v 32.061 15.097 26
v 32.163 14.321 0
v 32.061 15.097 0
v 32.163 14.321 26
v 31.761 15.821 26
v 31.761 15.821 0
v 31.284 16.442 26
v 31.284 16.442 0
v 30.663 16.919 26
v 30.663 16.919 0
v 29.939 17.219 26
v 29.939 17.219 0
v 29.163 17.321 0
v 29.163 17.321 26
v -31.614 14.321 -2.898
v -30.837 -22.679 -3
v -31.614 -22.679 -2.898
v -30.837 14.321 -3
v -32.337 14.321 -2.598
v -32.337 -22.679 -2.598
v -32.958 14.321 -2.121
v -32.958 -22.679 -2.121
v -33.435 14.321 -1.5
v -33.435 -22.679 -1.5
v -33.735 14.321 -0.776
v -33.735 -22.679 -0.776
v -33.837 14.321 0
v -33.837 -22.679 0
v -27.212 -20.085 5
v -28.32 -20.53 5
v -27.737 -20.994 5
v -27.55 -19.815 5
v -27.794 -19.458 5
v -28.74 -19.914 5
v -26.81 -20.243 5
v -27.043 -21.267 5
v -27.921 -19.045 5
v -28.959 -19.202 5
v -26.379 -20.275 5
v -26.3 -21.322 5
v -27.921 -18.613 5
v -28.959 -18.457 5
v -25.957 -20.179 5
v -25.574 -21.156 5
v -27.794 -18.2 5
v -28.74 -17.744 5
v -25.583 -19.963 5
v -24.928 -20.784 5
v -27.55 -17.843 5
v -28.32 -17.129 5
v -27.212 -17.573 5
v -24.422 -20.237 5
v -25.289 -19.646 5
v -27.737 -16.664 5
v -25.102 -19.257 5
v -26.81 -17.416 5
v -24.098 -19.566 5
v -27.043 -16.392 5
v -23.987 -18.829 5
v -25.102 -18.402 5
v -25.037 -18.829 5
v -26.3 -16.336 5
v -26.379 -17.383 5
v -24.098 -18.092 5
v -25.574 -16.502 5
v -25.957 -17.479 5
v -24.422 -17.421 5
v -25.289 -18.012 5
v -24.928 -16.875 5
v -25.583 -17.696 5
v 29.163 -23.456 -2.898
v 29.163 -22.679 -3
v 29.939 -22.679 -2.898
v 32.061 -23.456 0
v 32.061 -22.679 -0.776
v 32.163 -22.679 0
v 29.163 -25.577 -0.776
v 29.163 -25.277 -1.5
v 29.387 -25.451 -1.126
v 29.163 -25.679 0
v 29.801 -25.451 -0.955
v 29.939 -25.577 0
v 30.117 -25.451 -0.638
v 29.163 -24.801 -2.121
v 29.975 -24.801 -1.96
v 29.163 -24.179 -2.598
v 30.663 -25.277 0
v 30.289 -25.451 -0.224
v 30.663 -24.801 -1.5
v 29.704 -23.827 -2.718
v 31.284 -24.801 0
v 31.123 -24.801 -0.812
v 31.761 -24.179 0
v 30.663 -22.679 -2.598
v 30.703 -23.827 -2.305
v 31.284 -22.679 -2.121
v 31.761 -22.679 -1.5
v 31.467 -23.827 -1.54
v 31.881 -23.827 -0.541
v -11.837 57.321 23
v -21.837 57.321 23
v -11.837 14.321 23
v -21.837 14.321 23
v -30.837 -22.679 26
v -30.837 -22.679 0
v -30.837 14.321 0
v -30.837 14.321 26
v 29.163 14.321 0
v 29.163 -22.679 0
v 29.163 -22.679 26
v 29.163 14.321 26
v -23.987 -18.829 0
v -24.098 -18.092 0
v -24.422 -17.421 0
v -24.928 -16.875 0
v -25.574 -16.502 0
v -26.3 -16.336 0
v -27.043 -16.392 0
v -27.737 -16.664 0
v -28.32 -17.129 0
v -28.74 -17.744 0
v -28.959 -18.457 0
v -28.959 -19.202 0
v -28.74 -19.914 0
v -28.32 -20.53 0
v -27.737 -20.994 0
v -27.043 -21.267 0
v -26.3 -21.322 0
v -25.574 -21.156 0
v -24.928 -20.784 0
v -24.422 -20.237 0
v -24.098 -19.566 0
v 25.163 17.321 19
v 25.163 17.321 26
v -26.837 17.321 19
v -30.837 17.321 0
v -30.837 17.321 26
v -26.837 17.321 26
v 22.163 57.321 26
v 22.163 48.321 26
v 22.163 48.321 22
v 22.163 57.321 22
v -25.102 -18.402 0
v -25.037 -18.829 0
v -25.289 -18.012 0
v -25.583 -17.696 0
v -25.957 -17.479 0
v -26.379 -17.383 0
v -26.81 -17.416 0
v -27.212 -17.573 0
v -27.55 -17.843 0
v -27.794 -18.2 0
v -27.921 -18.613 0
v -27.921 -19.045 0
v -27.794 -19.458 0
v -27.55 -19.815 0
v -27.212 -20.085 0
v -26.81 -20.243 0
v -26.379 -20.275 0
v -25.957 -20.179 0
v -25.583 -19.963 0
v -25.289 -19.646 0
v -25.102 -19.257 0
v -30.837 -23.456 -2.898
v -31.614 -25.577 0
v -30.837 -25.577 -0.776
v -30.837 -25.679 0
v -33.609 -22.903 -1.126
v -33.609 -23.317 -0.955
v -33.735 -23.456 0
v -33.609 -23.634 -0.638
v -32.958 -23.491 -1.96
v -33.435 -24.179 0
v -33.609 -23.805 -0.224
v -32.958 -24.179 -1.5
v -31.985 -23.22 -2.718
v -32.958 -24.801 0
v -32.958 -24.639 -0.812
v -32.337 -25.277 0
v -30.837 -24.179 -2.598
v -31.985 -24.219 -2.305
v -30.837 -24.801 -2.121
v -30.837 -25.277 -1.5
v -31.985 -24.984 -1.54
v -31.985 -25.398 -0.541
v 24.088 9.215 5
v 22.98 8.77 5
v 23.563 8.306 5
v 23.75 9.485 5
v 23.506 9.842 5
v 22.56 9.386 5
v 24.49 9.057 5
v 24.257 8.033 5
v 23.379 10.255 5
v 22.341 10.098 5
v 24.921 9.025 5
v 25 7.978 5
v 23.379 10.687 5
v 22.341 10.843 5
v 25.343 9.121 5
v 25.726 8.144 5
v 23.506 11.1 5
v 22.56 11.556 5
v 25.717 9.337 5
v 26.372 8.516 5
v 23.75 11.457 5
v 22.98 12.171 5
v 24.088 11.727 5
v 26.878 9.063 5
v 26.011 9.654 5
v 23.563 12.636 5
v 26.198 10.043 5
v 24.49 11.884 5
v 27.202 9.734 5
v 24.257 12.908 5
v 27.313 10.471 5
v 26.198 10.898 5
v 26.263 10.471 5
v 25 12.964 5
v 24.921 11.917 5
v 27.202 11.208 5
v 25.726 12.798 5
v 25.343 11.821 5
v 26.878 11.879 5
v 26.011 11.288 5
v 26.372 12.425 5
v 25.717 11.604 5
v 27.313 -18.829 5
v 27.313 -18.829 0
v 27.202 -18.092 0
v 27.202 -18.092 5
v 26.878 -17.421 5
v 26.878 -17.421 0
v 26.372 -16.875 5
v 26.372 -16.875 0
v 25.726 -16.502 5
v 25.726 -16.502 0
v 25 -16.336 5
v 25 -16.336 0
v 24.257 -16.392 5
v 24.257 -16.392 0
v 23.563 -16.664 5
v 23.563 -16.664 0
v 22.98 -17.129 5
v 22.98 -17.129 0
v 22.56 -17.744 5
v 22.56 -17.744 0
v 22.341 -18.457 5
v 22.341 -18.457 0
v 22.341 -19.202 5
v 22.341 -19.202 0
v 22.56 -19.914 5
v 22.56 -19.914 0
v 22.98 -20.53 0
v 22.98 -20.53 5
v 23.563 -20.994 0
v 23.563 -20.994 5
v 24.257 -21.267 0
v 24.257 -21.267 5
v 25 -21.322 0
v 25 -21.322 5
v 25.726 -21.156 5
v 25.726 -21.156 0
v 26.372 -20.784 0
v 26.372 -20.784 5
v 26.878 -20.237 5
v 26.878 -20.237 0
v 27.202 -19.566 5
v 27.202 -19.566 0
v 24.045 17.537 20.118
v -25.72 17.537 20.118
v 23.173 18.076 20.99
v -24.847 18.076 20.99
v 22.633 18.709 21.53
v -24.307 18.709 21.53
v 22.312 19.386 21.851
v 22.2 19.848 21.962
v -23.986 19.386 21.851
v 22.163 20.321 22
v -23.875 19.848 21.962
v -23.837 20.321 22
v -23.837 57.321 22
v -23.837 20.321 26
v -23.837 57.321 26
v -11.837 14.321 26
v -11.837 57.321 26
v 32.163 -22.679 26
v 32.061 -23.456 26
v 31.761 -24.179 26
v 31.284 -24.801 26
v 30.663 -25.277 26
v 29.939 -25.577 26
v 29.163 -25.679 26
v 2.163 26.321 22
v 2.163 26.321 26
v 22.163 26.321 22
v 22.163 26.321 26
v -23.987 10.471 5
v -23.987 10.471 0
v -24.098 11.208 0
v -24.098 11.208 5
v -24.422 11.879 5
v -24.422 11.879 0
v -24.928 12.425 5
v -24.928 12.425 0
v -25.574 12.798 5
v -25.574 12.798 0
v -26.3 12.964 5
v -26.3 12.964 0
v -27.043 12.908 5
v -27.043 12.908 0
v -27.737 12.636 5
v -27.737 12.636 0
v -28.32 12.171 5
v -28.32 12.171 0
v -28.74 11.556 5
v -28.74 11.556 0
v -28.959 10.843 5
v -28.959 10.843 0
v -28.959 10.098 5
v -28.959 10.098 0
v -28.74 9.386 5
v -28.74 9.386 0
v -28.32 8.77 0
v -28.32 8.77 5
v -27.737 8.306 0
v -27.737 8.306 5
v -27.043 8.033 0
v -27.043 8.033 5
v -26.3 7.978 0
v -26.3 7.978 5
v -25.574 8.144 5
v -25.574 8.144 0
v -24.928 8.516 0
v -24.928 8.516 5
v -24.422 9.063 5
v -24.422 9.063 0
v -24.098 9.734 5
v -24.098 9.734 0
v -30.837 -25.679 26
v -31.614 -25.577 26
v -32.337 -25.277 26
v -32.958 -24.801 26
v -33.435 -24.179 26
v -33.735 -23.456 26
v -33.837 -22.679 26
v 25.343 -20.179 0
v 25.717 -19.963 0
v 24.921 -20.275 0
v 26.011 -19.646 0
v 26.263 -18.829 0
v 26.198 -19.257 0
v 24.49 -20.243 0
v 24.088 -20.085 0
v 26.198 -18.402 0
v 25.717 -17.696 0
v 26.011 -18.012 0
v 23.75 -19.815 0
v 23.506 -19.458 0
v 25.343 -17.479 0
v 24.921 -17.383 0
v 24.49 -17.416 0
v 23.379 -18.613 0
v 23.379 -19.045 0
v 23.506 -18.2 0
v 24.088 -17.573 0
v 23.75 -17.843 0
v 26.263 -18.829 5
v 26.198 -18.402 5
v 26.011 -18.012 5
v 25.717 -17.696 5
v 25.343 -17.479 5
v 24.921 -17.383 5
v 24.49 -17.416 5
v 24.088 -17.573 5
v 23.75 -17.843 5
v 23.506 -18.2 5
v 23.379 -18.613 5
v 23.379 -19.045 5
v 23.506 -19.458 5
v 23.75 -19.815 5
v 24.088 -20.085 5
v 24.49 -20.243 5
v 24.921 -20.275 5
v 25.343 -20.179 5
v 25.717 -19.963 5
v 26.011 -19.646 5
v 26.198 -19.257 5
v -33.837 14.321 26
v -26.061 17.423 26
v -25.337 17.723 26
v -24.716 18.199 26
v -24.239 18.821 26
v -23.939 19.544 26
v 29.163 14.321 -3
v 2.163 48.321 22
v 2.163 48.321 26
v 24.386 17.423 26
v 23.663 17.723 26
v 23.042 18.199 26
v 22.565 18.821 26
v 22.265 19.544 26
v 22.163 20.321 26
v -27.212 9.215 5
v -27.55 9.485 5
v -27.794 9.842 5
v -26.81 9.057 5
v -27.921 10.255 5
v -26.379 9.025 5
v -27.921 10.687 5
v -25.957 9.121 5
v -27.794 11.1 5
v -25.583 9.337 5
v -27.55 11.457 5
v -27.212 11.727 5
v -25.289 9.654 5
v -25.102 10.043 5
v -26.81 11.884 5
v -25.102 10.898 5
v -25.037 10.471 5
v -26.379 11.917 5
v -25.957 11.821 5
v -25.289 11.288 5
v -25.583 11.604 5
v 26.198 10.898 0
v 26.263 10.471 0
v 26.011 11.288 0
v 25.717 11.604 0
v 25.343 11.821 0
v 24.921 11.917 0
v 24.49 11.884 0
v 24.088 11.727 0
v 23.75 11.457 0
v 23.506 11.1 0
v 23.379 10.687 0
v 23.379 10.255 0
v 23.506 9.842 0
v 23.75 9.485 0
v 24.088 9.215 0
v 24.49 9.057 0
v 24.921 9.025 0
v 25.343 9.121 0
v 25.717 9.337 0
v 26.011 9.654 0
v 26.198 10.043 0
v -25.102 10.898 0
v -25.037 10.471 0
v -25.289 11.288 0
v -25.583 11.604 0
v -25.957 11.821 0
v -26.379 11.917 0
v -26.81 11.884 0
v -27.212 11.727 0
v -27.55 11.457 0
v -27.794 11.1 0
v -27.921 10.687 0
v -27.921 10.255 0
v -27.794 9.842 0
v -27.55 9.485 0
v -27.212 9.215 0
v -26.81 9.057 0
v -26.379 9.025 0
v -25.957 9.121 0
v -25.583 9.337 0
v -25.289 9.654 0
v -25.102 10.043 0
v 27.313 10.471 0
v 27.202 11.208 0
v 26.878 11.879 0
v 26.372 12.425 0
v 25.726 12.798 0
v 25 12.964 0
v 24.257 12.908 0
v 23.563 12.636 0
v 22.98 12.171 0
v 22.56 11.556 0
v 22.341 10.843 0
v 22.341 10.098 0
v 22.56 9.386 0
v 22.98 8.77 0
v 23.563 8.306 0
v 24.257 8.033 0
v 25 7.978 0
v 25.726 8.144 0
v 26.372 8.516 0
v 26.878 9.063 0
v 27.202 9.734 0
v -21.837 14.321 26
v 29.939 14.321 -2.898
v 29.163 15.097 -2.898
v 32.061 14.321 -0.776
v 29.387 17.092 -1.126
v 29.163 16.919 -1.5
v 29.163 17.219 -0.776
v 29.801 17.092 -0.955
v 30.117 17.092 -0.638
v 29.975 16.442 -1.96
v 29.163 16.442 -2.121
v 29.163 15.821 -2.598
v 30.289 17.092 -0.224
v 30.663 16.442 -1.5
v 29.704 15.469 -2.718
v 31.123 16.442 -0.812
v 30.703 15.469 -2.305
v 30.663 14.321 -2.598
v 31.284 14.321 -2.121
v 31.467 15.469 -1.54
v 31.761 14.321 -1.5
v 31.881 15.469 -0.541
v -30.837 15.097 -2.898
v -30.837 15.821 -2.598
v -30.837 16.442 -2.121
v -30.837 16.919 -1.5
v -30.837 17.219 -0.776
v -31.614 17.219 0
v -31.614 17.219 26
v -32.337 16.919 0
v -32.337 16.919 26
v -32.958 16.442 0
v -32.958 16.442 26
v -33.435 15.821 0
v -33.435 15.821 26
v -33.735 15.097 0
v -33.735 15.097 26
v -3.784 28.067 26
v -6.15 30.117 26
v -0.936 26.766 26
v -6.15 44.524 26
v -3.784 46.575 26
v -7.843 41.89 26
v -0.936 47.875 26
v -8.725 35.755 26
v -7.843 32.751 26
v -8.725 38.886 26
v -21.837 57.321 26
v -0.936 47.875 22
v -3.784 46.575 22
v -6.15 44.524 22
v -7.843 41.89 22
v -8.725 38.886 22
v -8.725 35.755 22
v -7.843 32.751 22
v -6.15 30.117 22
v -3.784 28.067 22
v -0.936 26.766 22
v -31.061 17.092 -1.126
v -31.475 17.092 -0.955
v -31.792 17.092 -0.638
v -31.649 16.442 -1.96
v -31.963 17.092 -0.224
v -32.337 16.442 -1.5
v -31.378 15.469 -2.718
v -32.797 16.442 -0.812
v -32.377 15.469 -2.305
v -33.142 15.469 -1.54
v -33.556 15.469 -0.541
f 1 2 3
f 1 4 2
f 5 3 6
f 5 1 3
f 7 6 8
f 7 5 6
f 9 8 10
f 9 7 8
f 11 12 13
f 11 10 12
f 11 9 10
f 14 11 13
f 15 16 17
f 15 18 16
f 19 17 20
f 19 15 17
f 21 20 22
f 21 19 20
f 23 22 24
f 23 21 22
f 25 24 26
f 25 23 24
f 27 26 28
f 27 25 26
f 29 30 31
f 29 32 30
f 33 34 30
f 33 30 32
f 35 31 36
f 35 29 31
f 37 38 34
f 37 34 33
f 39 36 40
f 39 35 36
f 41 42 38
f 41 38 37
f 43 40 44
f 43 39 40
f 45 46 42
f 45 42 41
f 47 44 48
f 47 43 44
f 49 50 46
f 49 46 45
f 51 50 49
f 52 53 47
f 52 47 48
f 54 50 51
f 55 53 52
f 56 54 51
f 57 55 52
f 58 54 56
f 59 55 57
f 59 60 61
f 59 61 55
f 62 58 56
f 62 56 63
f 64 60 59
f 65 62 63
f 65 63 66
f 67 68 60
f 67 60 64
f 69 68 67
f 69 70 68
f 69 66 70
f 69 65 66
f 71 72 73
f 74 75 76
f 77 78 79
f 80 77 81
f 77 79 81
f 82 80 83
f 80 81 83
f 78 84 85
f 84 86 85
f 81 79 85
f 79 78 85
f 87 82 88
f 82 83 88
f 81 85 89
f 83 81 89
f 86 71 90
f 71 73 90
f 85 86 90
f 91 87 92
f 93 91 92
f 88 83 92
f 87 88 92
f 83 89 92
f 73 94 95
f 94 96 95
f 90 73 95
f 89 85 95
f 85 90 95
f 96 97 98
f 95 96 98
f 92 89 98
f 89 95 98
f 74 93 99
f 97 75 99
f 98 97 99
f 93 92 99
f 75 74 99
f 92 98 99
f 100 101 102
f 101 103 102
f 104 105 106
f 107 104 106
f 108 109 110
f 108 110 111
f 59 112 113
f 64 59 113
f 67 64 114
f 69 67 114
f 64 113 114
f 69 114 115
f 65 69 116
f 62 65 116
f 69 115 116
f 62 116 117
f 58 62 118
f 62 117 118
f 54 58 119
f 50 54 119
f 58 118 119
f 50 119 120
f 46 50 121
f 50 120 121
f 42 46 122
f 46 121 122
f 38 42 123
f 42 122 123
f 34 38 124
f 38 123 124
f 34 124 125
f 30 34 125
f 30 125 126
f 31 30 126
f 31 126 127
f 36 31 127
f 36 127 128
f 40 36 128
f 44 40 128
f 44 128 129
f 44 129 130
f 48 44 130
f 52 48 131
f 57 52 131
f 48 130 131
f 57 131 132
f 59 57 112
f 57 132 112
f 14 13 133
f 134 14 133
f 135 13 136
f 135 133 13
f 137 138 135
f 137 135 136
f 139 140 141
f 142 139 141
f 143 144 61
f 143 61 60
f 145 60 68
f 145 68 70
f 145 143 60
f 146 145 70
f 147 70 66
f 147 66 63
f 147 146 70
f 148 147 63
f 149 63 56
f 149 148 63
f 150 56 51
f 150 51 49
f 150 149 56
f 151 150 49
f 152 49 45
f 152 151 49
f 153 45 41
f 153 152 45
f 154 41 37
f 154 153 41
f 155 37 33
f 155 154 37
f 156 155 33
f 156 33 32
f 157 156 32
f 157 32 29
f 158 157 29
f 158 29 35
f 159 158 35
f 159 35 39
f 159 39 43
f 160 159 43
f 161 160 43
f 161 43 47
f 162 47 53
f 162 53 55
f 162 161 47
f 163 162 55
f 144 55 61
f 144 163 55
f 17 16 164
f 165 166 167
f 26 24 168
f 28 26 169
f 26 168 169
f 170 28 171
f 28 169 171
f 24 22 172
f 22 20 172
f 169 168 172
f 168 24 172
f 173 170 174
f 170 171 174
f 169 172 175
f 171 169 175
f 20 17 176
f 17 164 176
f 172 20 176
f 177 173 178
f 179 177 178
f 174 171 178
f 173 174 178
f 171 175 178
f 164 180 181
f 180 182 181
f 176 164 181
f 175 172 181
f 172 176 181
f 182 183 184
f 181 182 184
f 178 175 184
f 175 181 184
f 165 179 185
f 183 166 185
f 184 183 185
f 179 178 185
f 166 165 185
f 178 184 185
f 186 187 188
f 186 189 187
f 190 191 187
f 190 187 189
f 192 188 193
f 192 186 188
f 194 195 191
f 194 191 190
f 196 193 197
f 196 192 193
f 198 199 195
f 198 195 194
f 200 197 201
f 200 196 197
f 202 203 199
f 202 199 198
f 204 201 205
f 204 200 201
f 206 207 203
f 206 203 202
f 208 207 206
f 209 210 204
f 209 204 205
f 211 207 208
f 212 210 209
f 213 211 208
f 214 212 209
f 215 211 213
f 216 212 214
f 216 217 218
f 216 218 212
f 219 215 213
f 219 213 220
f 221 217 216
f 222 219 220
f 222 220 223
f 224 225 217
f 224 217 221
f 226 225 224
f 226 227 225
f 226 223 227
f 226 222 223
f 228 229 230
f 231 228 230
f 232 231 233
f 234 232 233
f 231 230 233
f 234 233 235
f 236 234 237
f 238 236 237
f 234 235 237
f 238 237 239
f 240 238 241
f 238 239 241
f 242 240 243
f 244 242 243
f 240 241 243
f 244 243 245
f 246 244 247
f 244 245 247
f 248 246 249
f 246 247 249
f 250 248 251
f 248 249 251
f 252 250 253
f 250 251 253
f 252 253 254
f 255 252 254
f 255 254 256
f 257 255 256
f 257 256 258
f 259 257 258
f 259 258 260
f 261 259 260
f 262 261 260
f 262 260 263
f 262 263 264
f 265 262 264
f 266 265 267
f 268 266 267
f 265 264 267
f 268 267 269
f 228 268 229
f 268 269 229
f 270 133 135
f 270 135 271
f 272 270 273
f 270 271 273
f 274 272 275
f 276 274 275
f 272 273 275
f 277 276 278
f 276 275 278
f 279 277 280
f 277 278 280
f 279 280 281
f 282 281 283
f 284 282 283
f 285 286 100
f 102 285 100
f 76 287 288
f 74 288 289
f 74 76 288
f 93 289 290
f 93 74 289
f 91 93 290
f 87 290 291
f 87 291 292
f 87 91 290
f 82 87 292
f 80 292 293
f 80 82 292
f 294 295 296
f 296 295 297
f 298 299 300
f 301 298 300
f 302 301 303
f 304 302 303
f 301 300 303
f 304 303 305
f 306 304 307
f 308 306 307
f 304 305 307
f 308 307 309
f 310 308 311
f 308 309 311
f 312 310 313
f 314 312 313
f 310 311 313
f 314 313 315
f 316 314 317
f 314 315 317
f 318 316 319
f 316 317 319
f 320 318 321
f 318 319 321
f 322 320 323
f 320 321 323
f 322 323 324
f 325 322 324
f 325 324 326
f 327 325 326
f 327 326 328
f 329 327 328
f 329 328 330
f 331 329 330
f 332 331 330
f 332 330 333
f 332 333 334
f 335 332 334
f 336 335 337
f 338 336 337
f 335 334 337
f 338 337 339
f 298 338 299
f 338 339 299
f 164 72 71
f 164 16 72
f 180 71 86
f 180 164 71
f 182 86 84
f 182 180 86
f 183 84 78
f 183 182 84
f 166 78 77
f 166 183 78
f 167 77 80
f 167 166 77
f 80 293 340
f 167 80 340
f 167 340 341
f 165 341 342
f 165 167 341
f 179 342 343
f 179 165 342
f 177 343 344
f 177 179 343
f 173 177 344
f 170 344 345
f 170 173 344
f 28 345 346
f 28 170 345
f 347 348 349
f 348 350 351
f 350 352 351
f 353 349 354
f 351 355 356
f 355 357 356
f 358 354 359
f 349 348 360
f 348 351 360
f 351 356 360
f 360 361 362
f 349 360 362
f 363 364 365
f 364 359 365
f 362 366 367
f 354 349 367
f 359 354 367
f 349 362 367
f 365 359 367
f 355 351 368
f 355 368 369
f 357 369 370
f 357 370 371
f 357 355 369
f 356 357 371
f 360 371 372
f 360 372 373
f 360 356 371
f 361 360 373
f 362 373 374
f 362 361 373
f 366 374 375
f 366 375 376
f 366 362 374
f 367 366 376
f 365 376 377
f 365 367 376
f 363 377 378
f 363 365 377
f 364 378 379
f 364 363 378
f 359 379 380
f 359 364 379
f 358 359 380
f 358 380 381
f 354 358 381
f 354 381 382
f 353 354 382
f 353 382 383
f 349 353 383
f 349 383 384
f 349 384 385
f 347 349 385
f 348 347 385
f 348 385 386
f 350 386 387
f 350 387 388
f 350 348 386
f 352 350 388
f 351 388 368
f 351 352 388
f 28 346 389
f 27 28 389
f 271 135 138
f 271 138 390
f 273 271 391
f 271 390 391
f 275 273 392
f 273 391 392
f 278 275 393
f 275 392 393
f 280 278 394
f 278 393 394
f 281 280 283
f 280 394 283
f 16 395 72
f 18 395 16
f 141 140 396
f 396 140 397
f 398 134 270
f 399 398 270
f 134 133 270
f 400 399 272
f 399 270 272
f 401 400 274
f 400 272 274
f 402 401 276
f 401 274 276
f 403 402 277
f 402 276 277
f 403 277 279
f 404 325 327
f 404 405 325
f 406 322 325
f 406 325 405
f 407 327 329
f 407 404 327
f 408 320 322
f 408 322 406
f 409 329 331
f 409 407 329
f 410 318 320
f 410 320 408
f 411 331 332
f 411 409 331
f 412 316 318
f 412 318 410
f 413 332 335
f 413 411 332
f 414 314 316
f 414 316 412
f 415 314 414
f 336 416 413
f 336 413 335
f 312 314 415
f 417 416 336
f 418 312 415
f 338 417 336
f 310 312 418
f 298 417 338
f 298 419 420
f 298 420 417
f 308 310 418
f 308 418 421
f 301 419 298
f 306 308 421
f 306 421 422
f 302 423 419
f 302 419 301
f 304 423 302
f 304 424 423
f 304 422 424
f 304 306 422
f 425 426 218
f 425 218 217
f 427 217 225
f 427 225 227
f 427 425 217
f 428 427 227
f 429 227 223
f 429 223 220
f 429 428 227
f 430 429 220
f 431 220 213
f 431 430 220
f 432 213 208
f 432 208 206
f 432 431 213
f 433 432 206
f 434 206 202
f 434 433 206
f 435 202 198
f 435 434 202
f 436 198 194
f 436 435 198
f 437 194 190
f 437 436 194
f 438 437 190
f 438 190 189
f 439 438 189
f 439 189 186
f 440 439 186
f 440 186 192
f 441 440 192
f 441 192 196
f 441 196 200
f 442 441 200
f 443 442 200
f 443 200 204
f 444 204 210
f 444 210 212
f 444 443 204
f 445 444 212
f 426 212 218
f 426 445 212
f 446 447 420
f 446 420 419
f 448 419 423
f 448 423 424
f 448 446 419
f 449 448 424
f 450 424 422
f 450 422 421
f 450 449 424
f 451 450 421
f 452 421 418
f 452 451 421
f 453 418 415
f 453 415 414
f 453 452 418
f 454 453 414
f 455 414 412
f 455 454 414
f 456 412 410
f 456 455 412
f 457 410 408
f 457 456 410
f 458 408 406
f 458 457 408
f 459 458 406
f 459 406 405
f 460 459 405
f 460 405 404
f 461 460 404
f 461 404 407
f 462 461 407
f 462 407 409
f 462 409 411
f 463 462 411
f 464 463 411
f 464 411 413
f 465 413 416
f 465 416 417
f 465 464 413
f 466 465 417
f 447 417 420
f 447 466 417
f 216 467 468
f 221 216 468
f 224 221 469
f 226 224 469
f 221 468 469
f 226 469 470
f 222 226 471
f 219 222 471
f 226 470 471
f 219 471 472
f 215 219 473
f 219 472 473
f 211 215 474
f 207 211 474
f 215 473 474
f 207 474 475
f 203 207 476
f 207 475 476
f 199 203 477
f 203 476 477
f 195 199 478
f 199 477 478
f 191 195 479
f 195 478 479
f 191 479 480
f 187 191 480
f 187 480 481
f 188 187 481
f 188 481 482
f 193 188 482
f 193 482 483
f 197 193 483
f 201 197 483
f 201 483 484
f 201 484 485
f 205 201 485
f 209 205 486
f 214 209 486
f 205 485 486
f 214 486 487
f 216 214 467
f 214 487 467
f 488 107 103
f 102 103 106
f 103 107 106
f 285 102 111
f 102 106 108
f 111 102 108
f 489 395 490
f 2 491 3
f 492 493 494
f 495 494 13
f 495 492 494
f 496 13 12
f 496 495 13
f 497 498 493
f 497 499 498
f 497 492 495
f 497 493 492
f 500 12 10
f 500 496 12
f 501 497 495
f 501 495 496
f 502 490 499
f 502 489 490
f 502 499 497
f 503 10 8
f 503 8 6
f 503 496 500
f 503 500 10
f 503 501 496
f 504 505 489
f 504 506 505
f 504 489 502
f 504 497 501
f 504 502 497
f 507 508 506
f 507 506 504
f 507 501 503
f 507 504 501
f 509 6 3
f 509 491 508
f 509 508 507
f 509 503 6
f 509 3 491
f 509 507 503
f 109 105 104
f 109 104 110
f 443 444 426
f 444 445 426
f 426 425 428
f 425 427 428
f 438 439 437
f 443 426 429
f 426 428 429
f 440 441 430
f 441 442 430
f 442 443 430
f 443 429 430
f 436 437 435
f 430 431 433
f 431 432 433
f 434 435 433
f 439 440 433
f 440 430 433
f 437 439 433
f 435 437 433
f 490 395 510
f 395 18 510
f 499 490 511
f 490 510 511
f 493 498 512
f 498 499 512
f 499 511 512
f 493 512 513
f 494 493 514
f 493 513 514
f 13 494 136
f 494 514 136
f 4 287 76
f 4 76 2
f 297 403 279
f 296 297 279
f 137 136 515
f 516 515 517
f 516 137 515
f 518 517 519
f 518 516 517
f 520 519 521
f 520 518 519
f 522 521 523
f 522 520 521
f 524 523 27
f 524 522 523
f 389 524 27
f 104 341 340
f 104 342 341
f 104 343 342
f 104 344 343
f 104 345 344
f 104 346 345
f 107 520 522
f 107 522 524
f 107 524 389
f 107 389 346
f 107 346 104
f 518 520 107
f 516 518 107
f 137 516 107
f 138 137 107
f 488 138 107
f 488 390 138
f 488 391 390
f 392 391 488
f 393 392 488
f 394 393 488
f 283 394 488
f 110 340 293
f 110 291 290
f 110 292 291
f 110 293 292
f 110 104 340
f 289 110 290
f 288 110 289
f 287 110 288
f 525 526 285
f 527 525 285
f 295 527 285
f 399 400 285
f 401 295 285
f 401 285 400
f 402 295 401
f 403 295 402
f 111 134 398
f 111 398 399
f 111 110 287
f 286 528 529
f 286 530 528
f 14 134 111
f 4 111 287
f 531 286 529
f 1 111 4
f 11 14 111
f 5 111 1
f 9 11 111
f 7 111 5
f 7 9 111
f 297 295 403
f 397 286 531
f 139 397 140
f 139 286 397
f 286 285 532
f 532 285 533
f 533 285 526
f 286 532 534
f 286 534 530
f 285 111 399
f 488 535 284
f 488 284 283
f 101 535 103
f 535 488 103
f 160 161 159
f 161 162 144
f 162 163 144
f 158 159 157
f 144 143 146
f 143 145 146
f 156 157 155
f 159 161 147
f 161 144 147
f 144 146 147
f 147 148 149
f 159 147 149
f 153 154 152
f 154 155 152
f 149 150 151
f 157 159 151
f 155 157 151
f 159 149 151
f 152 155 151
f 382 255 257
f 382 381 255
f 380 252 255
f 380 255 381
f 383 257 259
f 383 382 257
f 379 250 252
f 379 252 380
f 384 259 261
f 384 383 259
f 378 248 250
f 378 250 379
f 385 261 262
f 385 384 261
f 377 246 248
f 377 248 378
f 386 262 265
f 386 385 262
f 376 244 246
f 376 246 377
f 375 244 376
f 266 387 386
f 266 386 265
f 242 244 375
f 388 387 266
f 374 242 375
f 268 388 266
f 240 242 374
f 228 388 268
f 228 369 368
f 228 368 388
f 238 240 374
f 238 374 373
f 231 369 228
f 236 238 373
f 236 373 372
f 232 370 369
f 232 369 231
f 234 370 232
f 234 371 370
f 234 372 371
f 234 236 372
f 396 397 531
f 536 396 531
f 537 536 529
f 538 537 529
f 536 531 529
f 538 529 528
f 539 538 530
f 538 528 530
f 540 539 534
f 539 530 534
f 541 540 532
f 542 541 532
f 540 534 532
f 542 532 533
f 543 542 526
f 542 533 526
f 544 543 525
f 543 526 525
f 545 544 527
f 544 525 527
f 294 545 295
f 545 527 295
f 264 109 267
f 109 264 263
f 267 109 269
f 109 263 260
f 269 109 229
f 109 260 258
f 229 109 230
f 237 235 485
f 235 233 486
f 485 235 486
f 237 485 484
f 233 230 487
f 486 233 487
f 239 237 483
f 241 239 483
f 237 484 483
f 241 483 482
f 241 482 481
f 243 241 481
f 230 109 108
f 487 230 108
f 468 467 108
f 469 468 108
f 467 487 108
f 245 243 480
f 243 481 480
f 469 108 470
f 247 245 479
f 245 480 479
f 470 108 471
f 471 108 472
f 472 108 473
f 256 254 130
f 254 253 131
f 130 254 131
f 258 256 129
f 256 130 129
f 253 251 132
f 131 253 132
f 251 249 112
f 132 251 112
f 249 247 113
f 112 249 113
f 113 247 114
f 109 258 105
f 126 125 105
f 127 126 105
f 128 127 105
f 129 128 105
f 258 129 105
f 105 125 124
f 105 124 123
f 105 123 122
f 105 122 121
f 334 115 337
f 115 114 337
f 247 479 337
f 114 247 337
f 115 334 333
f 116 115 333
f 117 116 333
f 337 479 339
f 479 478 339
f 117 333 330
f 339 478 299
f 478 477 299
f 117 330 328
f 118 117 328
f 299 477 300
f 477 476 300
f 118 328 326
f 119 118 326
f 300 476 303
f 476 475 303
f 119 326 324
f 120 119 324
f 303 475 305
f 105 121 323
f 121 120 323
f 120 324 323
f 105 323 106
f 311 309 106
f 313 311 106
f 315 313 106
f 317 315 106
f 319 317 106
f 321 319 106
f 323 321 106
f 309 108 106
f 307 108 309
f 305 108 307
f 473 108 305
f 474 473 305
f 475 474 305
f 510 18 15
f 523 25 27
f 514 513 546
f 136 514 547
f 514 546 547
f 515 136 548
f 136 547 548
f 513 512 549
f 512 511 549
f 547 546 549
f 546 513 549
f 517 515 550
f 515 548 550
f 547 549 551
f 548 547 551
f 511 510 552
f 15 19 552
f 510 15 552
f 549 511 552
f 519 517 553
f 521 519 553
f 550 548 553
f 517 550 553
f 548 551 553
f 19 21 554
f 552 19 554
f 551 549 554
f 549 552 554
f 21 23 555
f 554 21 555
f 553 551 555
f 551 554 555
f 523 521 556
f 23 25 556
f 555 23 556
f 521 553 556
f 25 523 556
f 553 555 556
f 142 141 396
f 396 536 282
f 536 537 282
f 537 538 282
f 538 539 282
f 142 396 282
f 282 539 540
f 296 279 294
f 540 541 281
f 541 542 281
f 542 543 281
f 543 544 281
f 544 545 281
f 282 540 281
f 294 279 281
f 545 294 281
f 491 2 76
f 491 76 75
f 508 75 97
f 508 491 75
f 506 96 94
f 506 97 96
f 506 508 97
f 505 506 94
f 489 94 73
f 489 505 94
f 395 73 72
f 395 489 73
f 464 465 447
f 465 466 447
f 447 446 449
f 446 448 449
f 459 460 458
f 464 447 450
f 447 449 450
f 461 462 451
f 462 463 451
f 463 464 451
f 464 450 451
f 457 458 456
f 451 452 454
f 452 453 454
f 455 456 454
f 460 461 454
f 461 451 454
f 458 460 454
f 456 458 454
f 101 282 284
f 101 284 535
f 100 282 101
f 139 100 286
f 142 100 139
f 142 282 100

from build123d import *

# Parameters (mm, degrees)
SKETCH_1_W          = 66
SKETCH_1_H          = 43
SKETCH_1_W_2        = 60
SKETCH_1_H_2        = 37
EXTRUDE_1_DEPTH     = 26
SKETCH_2_W          = 66
SKETCH_2_H          = 43
EXTRUDE_2_DEPTH     = 3
EXTRUDE_3_DEPTH     = 40
CUT_EXTRUDE_1_REACH = 45
SKETCH_4_W          = 10
SKETCH_4_H          = 3
SKETCH_6_R          = 2.5
SKETCH_6_R_2        = 1.45
EXTRUDE_5_DEPTH     = 5
CUT_EXTRUDE_2_REACH = 31
FILLET_1_R          = 3
FILLET_2_R          = 3


with BuildPart() as part:
    # 草图1 → 凸台-拉伸1 (new body)
    with BuildSketch(Plane.XY):
        with Locations((-0.837138389, -4.179180765)):
            Rectangle(SKETCH_1_W, SKETCH_1_H)
        with Locations((-0.837138389, -4.179180765)):
            Rectangle(SKETCH_1_W_2, SKETCH_1_H_2, mode=Mode.SUBTRACT)
    extrude(amount=EXTRUDE_1_DEPTH)

    # 草图2 → 凸台-拉伸2 (add)
    with BuildSketch(Plane(origin=(0, 0, 0), x_dir=(-1, 0, 0), z_dir=(0, 0, -1))):
        with Locations((0.837138389, -4.179180765)):
            Rectangle(SKETCH_2_W, SKETCH_2_H)
    extrude(amount=EXTRUDE_2_DEPTH)

    # 草图3 → 凸台-拉伸3 (add)
    with BuildSketch(Plane(origin=(0, 17.320819235, 0), x_dir=(1, 0, 0), z_dir=(0, 1, 0))):
        Polygon((-21.837138389, -26), (-21.837138389, -23), (-11.837138389, -23), (-11.837138389, -26), (22.162861611, -26), (22.162861611, -22), (-23.837138389, -22), (-23.837138389, -26), align=None)
    extrude(amount=EXTRUDE_3_DEPTH)

    # 草图4 → 切除-拉伸1 (cut, up to next)
    with BuildSketch(Plane(origin=(0, 17.320819235, 0), x_dir=(1, 0, 0), z_dir=(0, 1, 0)), mode=Mode.PRIVATE) as cut_extrude_1_sk1:
        with Locations((-16.837138389, -24.5)):
            Rectangle(SKETCH_4_W, SKETCH_4_H)
    cut_extrude_1_tool1 = extrude(cut_extrude_1_sk1.sketch, amount=-CUT_EXTRUDE_1_REACH, mode=Mode.PRIVATE) & part.part
    add(cut_extrude_1_tool1.solids().sort_by_distance((-16.837138, 17.320819, 24.5))[0], mode=Mode.SUBTRACT)

    # 草图6 → 凸台-拉伸5 (add)
    with BuildSketch(Plane.XY):
        with Locations((24.812861611, -18.829180765)):
            Circle(SKETCH_6_R)
        with Locations((24.812861611, -18.829180765)):
            Circle(SKETCH_6_R_2, mode=Mode.SUBTRACT)
        with Locations((-26.487138389, -18.829180765)):
            Circle(SKETCH_6_R)
        with Locations((-26.487138389, -18.829180765)):
            Circle(SKETCH_6_R_2, mode=Mode.SUBTRACT)
        with Locations((24.812861611, 10.470819235)):
            Circle(SKETCH_6_R)
        with Locations((24.812861611, 10.470819235)):
            Circle(SKETCH_6_R_2, mode=Mode.SUBTRACT)
        with Locations((-26.487138389, 10.470819235)):
            Circle(SKETCH_6_R)
        with Locations((-26.487138389, 10.470819235)):
            Circle(SKETCH_6_R_2, mode=Mode.SUBTRACT)
    extrude(amount=EXTRUDE_5_DEPTH)

    # 草图10 → 切除-拉伸2 (cut, up to next)
    with BuildSketch(Plane.XY.offset(26), mode=Mode.PRIVATE) as cut_extrude_2_sk1:
        with BuildLine():
            Line((2.162861611, 26.320819235), (22.162861611, 26.320819235))
            Line((22.162861611, 26.320819235), (22.162861611, 48.320819235))
            Line((22.162861611, 48.320819235), (2.162861611, 48.320819235))
            ThreePointArc((2.162861611, 48.320819235), (-8.837138389, 37.320819235), (2.162861611, 26.320819235))
        make_face()
    cut_extrude_2_tool1 = extrude(cut_extrude_2_sk1.sketch, amount=-CUT_EXTRUDE_2_REACH, mode=Mode.PRIVATE) & part.part
    add(cut_extrude_2_tool1.solids().sort_by_distance((7.737936, 37.320819, 26))[0], mode=Mode.SUBTRACT)

    # 圆角1
    fillet_1_edges = [part.edges().sort_by_distance(p)[0] for p in [
        (32.162861611, -4.179180765, -3),
        (-0.837138389, -25.679180765, -3),
        (-33.837138389, -4.179180765, -3),
        (-0.837138389, 17.320819235, -3),
        (32.162861611, -25.679180765, 11.5),
        (-33.837138389, -25.679180765, 11.5),
        (-33.837138389, 17.320819235, 11.5),
        (32.162861611, 17.320819235, 11.5),
    ]]
    fillet(fillet_1_edges, radius=FILLET_1_R)

    # 圆角2
    fillet_2_edges = [part.edges().sort_by_distance(p)[0] for p in [
        (-23.837138389, 17.320819235, 24),
        (22.162861611, 17.320819235, 24),
        (-0.837138389, 17.320819235, 22),
    ]]
    fillet(fillet_2_edges, radius=FILLET_2_R)


solid = part.part
